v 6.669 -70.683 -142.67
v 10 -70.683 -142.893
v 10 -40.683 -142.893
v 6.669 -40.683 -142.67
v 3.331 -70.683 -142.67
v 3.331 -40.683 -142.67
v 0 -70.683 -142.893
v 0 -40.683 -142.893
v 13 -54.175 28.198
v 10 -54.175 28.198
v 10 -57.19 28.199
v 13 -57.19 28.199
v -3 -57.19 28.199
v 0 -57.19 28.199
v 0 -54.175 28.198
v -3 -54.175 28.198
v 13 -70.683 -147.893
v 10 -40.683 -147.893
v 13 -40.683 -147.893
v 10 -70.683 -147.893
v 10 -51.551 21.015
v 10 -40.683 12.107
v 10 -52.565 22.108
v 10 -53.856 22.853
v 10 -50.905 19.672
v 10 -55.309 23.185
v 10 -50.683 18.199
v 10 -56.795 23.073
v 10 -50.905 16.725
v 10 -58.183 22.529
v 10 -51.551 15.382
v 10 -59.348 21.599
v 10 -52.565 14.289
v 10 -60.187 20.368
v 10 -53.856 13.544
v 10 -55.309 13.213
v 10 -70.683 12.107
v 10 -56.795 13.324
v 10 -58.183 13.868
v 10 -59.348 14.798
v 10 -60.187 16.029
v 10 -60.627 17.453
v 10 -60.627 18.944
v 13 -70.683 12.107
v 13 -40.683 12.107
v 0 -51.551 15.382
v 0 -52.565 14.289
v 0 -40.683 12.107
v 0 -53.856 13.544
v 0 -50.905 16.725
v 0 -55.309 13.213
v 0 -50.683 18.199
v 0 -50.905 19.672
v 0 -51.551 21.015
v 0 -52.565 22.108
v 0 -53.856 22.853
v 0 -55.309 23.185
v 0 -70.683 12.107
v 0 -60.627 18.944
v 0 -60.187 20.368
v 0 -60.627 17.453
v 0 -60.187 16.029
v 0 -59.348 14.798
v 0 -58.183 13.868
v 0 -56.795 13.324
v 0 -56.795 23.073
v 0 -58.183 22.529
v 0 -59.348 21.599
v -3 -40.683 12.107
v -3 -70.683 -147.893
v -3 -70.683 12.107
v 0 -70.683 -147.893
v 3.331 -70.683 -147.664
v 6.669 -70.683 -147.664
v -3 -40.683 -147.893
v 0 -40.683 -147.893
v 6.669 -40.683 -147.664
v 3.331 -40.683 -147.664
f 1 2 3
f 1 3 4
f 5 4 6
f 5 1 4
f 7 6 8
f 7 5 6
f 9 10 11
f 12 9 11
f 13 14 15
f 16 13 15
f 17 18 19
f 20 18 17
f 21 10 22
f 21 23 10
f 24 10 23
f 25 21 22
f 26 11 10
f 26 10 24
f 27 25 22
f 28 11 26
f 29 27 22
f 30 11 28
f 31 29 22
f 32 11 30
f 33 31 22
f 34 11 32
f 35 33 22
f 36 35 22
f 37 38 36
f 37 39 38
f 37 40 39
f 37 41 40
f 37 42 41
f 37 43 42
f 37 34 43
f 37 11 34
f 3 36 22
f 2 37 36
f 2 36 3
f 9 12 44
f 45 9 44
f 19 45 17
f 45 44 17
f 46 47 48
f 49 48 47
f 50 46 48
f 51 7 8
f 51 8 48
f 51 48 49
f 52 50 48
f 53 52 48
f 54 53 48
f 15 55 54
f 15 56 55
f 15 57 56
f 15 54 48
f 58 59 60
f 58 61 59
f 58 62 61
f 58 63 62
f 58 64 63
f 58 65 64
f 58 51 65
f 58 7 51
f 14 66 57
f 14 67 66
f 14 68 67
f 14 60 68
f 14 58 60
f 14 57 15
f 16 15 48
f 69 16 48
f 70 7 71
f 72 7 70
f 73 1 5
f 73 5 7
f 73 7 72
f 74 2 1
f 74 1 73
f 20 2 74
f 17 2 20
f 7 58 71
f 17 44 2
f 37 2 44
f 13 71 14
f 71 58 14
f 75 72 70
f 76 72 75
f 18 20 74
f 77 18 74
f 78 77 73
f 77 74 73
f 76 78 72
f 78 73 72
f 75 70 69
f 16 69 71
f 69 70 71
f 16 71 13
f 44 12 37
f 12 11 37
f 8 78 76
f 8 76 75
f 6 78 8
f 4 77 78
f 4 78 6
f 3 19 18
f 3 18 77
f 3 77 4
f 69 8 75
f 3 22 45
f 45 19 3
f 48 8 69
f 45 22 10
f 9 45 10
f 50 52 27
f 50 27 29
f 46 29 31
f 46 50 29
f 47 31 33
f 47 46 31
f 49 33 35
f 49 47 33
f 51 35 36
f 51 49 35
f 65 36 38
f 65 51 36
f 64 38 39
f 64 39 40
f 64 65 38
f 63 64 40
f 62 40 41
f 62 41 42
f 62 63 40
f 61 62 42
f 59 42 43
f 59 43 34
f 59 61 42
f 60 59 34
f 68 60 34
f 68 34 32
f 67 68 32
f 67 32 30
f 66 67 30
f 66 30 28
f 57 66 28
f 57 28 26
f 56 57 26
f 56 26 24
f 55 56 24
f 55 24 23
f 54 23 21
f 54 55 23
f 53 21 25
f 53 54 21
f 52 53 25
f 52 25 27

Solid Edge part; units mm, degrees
sketch "Sketch1" plane through (0, 0, 0) normal (1, 0, 0) x (0, 1, 0)
  line L0 (-70.6829, -147.8929) -> (-40.6829, -147.8929)
  line L1 (-40.6829, -147.8929) -> (-40.6829, 12.1071)
  line L2 (-40.6829, 12.1071) -> (-70.6829, 12.1071)
  line L3 (-70.6829, 12.1071) -> (-70.6829, -147.8929)
  line L4 (-70.6829, 12.1071) -> (-40.6829, 12.1071)
  line L5 (-54.1753, 28.1984) -> (-40.6829, 12.1071)
  line L6 (-57.1901, 28.1988) -> (-54.1753, 28.1984)
  line L7 (-70.6829, 12.1071) -> (-57.1901, 28.1988)
  dimension "D1" = 30
  dimension "D2" = 20.9994
  dimension "D3" = 21
  dimension "D4" = 160
  dimension "D5" = 30
extrude "Protrusion1" add sketch "Sketch1" against normal blind 3
sketch "Sketch2" plane through (0, -21.8205, 20.1807) normal (1, 0, 0) x (0, 1, 0)
  circle A0 centre (-33.8621, -1.9821) radius 5
  dimension "D1" = 10
extrude "ExtrudedProtrusion_2" add sketch "Sketch2" along normal blind 11
mirror "Mirror1" about plane through (5, -21.8205, 20.1506) normal (1, 0, 0) of "Protrusion1"
sketch "Sketch3" plane through (11.5, -70.6829, -27.8929) normal (0, -1, 0) x (0, 0, -1)
  arc A0 (120, -1.5) -> (120, -11.5) centre (168.482, -6.5) ccw
  line L0 (115, -1.5) -> (120, -1.5)
  arc A1 (115, -1.5) -> (115, -11.5) centre (164.7494, -6.5) ccw
  line L1 (120, -11.5) -> (115, -11.5)
  dimension "D1" = 5
extrude "ExtrudedProtrusion_4" add sketch "Sketch3" against normal blind 30
